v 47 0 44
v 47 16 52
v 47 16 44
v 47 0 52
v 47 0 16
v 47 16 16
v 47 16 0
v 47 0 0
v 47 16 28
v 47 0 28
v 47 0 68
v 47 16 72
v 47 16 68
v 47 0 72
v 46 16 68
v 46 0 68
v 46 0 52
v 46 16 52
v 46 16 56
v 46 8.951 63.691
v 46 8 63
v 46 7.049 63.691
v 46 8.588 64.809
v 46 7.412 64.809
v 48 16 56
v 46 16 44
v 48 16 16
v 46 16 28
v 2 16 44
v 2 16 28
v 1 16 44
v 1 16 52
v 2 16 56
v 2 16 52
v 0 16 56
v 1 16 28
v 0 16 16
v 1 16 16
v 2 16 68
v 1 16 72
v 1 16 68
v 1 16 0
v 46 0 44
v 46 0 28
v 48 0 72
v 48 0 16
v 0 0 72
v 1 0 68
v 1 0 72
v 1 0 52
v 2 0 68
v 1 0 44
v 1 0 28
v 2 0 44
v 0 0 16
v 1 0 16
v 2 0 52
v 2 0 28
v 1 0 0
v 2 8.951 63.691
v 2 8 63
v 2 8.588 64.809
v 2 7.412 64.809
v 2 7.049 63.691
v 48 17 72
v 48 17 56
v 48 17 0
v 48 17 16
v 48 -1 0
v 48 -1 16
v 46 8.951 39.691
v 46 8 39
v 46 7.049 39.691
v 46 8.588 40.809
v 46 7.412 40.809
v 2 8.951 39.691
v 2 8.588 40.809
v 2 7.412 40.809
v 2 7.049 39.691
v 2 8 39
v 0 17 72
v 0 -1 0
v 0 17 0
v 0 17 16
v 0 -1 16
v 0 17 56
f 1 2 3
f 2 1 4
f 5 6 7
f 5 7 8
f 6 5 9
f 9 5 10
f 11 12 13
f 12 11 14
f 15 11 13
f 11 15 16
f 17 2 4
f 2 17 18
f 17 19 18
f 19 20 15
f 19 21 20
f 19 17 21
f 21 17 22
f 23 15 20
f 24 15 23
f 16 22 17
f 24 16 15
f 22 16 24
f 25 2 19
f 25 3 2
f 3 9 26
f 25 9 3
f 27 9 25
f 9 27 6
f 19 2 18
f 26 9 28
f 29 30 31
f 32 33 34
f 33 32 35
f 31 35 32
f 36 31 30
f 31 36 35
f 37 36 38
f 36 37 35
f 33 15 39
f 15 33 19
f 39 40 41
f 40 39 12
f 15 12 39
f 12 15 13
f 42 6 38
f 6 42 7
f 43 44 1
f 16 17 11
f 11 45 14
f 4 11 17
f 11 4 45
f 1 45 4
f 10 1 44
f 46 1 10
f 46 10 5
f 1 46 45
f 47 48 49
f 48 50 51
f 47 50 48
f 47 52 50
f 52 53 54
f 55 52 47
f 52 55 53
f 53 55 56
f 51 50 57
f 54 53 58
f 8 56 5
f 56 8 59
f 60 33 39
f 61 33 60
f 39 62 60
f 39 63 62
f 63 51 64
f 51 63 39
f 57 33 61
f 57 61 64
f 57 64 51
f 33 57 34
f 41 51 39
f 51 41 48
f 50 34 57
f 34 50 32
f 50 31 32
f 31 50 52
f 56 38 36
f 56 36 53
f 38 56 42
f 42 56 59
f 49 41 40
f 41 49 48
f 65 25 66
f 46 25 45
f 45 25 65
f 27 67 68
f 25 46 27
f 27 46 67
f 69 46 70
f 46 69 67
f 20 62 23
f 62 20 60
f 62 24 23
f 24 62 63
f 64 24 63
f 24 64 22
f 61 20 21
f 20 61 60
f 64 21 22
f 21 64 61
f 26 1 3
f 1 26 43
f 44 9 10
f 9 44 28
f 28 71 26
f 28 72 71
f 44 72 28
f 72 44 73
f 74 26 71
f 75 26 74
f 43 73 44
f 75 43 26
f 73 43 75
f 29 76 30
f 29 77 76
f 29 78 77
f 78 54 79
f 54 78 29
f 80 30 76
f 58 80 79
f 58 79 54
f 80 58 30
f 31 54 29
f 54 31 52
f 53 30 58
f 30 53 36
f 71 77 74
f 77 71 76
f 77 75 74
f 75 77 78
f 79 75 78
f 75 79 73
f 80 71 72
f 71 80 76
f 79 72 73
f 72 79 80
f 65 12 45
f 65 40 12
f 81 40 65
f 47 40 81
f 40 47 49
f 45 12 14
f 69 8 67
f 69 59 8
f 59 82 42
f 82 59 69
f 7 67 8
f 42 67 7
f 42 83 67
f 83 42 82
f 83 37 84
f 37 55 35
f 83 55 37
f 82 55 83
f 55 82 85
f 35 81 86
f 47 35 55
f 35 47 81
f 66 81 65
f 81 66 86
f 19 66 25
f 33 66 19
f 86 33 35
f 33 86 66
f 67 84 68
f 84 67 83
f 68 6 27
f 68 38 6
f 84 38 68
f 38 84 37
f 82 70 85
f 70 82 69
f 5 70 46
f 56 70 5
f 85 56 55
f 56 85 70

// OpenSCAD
// vertical right wall
translate([4*12-1, 0, 0]){
  scale([1, 1*16, 6*12]){
    cube(1);
  }
}
// vertical left wall
  scale([1, 1*16, 6*12]){
    cube(1);
  }
  
  
// horizontal back support on bottom
translate([0, 0, 12*4+8]){
translate([0, 16, 0]){
  rotate(90,[0,1,0]){
  rotate(90,[0,0,1]){  
  scale([1, 1*16, 4*12]){
    cube(1);
  }
}}}}
  
// horizontal back support on bottom
translate([0, 16, 0]){
  rotate(90,[0,1,0]){
  rotate(90,[0,0,1]){  
  scale([1, 1*16, 4*12]){
    cube(1);
  }
}}}

// horizontal front support on bottom
translate([0, -1, 0]){
  rotate(90,[0,1,0]){
  rotate(90,[0,0,1]){  
  scale([1, 1*16, 4*12]){
    cube(1);
  }
}}}

module bar_and_support(){
// top bar support on right 
translate([4*12-2, 0, 5*12-8]){
  scale([1, 1*16, 1*16]){
    cube(1);
  }
}

// top bar support on left 
translate([1, 0, 5*12-8]){
  scale([1, 1*16, 1*16]){
    cube(1);
  }
}

// top bar    
translate([1, 8, 5*12+4]){
  rotate(90, [0,1,0]){
    scale([1, 1, 4*12-1]){
      cylinder(1);
    }
  }
}
}

bar_and_support();
 translate([0, 0, -2*12]){
   bar_and_support();
}
